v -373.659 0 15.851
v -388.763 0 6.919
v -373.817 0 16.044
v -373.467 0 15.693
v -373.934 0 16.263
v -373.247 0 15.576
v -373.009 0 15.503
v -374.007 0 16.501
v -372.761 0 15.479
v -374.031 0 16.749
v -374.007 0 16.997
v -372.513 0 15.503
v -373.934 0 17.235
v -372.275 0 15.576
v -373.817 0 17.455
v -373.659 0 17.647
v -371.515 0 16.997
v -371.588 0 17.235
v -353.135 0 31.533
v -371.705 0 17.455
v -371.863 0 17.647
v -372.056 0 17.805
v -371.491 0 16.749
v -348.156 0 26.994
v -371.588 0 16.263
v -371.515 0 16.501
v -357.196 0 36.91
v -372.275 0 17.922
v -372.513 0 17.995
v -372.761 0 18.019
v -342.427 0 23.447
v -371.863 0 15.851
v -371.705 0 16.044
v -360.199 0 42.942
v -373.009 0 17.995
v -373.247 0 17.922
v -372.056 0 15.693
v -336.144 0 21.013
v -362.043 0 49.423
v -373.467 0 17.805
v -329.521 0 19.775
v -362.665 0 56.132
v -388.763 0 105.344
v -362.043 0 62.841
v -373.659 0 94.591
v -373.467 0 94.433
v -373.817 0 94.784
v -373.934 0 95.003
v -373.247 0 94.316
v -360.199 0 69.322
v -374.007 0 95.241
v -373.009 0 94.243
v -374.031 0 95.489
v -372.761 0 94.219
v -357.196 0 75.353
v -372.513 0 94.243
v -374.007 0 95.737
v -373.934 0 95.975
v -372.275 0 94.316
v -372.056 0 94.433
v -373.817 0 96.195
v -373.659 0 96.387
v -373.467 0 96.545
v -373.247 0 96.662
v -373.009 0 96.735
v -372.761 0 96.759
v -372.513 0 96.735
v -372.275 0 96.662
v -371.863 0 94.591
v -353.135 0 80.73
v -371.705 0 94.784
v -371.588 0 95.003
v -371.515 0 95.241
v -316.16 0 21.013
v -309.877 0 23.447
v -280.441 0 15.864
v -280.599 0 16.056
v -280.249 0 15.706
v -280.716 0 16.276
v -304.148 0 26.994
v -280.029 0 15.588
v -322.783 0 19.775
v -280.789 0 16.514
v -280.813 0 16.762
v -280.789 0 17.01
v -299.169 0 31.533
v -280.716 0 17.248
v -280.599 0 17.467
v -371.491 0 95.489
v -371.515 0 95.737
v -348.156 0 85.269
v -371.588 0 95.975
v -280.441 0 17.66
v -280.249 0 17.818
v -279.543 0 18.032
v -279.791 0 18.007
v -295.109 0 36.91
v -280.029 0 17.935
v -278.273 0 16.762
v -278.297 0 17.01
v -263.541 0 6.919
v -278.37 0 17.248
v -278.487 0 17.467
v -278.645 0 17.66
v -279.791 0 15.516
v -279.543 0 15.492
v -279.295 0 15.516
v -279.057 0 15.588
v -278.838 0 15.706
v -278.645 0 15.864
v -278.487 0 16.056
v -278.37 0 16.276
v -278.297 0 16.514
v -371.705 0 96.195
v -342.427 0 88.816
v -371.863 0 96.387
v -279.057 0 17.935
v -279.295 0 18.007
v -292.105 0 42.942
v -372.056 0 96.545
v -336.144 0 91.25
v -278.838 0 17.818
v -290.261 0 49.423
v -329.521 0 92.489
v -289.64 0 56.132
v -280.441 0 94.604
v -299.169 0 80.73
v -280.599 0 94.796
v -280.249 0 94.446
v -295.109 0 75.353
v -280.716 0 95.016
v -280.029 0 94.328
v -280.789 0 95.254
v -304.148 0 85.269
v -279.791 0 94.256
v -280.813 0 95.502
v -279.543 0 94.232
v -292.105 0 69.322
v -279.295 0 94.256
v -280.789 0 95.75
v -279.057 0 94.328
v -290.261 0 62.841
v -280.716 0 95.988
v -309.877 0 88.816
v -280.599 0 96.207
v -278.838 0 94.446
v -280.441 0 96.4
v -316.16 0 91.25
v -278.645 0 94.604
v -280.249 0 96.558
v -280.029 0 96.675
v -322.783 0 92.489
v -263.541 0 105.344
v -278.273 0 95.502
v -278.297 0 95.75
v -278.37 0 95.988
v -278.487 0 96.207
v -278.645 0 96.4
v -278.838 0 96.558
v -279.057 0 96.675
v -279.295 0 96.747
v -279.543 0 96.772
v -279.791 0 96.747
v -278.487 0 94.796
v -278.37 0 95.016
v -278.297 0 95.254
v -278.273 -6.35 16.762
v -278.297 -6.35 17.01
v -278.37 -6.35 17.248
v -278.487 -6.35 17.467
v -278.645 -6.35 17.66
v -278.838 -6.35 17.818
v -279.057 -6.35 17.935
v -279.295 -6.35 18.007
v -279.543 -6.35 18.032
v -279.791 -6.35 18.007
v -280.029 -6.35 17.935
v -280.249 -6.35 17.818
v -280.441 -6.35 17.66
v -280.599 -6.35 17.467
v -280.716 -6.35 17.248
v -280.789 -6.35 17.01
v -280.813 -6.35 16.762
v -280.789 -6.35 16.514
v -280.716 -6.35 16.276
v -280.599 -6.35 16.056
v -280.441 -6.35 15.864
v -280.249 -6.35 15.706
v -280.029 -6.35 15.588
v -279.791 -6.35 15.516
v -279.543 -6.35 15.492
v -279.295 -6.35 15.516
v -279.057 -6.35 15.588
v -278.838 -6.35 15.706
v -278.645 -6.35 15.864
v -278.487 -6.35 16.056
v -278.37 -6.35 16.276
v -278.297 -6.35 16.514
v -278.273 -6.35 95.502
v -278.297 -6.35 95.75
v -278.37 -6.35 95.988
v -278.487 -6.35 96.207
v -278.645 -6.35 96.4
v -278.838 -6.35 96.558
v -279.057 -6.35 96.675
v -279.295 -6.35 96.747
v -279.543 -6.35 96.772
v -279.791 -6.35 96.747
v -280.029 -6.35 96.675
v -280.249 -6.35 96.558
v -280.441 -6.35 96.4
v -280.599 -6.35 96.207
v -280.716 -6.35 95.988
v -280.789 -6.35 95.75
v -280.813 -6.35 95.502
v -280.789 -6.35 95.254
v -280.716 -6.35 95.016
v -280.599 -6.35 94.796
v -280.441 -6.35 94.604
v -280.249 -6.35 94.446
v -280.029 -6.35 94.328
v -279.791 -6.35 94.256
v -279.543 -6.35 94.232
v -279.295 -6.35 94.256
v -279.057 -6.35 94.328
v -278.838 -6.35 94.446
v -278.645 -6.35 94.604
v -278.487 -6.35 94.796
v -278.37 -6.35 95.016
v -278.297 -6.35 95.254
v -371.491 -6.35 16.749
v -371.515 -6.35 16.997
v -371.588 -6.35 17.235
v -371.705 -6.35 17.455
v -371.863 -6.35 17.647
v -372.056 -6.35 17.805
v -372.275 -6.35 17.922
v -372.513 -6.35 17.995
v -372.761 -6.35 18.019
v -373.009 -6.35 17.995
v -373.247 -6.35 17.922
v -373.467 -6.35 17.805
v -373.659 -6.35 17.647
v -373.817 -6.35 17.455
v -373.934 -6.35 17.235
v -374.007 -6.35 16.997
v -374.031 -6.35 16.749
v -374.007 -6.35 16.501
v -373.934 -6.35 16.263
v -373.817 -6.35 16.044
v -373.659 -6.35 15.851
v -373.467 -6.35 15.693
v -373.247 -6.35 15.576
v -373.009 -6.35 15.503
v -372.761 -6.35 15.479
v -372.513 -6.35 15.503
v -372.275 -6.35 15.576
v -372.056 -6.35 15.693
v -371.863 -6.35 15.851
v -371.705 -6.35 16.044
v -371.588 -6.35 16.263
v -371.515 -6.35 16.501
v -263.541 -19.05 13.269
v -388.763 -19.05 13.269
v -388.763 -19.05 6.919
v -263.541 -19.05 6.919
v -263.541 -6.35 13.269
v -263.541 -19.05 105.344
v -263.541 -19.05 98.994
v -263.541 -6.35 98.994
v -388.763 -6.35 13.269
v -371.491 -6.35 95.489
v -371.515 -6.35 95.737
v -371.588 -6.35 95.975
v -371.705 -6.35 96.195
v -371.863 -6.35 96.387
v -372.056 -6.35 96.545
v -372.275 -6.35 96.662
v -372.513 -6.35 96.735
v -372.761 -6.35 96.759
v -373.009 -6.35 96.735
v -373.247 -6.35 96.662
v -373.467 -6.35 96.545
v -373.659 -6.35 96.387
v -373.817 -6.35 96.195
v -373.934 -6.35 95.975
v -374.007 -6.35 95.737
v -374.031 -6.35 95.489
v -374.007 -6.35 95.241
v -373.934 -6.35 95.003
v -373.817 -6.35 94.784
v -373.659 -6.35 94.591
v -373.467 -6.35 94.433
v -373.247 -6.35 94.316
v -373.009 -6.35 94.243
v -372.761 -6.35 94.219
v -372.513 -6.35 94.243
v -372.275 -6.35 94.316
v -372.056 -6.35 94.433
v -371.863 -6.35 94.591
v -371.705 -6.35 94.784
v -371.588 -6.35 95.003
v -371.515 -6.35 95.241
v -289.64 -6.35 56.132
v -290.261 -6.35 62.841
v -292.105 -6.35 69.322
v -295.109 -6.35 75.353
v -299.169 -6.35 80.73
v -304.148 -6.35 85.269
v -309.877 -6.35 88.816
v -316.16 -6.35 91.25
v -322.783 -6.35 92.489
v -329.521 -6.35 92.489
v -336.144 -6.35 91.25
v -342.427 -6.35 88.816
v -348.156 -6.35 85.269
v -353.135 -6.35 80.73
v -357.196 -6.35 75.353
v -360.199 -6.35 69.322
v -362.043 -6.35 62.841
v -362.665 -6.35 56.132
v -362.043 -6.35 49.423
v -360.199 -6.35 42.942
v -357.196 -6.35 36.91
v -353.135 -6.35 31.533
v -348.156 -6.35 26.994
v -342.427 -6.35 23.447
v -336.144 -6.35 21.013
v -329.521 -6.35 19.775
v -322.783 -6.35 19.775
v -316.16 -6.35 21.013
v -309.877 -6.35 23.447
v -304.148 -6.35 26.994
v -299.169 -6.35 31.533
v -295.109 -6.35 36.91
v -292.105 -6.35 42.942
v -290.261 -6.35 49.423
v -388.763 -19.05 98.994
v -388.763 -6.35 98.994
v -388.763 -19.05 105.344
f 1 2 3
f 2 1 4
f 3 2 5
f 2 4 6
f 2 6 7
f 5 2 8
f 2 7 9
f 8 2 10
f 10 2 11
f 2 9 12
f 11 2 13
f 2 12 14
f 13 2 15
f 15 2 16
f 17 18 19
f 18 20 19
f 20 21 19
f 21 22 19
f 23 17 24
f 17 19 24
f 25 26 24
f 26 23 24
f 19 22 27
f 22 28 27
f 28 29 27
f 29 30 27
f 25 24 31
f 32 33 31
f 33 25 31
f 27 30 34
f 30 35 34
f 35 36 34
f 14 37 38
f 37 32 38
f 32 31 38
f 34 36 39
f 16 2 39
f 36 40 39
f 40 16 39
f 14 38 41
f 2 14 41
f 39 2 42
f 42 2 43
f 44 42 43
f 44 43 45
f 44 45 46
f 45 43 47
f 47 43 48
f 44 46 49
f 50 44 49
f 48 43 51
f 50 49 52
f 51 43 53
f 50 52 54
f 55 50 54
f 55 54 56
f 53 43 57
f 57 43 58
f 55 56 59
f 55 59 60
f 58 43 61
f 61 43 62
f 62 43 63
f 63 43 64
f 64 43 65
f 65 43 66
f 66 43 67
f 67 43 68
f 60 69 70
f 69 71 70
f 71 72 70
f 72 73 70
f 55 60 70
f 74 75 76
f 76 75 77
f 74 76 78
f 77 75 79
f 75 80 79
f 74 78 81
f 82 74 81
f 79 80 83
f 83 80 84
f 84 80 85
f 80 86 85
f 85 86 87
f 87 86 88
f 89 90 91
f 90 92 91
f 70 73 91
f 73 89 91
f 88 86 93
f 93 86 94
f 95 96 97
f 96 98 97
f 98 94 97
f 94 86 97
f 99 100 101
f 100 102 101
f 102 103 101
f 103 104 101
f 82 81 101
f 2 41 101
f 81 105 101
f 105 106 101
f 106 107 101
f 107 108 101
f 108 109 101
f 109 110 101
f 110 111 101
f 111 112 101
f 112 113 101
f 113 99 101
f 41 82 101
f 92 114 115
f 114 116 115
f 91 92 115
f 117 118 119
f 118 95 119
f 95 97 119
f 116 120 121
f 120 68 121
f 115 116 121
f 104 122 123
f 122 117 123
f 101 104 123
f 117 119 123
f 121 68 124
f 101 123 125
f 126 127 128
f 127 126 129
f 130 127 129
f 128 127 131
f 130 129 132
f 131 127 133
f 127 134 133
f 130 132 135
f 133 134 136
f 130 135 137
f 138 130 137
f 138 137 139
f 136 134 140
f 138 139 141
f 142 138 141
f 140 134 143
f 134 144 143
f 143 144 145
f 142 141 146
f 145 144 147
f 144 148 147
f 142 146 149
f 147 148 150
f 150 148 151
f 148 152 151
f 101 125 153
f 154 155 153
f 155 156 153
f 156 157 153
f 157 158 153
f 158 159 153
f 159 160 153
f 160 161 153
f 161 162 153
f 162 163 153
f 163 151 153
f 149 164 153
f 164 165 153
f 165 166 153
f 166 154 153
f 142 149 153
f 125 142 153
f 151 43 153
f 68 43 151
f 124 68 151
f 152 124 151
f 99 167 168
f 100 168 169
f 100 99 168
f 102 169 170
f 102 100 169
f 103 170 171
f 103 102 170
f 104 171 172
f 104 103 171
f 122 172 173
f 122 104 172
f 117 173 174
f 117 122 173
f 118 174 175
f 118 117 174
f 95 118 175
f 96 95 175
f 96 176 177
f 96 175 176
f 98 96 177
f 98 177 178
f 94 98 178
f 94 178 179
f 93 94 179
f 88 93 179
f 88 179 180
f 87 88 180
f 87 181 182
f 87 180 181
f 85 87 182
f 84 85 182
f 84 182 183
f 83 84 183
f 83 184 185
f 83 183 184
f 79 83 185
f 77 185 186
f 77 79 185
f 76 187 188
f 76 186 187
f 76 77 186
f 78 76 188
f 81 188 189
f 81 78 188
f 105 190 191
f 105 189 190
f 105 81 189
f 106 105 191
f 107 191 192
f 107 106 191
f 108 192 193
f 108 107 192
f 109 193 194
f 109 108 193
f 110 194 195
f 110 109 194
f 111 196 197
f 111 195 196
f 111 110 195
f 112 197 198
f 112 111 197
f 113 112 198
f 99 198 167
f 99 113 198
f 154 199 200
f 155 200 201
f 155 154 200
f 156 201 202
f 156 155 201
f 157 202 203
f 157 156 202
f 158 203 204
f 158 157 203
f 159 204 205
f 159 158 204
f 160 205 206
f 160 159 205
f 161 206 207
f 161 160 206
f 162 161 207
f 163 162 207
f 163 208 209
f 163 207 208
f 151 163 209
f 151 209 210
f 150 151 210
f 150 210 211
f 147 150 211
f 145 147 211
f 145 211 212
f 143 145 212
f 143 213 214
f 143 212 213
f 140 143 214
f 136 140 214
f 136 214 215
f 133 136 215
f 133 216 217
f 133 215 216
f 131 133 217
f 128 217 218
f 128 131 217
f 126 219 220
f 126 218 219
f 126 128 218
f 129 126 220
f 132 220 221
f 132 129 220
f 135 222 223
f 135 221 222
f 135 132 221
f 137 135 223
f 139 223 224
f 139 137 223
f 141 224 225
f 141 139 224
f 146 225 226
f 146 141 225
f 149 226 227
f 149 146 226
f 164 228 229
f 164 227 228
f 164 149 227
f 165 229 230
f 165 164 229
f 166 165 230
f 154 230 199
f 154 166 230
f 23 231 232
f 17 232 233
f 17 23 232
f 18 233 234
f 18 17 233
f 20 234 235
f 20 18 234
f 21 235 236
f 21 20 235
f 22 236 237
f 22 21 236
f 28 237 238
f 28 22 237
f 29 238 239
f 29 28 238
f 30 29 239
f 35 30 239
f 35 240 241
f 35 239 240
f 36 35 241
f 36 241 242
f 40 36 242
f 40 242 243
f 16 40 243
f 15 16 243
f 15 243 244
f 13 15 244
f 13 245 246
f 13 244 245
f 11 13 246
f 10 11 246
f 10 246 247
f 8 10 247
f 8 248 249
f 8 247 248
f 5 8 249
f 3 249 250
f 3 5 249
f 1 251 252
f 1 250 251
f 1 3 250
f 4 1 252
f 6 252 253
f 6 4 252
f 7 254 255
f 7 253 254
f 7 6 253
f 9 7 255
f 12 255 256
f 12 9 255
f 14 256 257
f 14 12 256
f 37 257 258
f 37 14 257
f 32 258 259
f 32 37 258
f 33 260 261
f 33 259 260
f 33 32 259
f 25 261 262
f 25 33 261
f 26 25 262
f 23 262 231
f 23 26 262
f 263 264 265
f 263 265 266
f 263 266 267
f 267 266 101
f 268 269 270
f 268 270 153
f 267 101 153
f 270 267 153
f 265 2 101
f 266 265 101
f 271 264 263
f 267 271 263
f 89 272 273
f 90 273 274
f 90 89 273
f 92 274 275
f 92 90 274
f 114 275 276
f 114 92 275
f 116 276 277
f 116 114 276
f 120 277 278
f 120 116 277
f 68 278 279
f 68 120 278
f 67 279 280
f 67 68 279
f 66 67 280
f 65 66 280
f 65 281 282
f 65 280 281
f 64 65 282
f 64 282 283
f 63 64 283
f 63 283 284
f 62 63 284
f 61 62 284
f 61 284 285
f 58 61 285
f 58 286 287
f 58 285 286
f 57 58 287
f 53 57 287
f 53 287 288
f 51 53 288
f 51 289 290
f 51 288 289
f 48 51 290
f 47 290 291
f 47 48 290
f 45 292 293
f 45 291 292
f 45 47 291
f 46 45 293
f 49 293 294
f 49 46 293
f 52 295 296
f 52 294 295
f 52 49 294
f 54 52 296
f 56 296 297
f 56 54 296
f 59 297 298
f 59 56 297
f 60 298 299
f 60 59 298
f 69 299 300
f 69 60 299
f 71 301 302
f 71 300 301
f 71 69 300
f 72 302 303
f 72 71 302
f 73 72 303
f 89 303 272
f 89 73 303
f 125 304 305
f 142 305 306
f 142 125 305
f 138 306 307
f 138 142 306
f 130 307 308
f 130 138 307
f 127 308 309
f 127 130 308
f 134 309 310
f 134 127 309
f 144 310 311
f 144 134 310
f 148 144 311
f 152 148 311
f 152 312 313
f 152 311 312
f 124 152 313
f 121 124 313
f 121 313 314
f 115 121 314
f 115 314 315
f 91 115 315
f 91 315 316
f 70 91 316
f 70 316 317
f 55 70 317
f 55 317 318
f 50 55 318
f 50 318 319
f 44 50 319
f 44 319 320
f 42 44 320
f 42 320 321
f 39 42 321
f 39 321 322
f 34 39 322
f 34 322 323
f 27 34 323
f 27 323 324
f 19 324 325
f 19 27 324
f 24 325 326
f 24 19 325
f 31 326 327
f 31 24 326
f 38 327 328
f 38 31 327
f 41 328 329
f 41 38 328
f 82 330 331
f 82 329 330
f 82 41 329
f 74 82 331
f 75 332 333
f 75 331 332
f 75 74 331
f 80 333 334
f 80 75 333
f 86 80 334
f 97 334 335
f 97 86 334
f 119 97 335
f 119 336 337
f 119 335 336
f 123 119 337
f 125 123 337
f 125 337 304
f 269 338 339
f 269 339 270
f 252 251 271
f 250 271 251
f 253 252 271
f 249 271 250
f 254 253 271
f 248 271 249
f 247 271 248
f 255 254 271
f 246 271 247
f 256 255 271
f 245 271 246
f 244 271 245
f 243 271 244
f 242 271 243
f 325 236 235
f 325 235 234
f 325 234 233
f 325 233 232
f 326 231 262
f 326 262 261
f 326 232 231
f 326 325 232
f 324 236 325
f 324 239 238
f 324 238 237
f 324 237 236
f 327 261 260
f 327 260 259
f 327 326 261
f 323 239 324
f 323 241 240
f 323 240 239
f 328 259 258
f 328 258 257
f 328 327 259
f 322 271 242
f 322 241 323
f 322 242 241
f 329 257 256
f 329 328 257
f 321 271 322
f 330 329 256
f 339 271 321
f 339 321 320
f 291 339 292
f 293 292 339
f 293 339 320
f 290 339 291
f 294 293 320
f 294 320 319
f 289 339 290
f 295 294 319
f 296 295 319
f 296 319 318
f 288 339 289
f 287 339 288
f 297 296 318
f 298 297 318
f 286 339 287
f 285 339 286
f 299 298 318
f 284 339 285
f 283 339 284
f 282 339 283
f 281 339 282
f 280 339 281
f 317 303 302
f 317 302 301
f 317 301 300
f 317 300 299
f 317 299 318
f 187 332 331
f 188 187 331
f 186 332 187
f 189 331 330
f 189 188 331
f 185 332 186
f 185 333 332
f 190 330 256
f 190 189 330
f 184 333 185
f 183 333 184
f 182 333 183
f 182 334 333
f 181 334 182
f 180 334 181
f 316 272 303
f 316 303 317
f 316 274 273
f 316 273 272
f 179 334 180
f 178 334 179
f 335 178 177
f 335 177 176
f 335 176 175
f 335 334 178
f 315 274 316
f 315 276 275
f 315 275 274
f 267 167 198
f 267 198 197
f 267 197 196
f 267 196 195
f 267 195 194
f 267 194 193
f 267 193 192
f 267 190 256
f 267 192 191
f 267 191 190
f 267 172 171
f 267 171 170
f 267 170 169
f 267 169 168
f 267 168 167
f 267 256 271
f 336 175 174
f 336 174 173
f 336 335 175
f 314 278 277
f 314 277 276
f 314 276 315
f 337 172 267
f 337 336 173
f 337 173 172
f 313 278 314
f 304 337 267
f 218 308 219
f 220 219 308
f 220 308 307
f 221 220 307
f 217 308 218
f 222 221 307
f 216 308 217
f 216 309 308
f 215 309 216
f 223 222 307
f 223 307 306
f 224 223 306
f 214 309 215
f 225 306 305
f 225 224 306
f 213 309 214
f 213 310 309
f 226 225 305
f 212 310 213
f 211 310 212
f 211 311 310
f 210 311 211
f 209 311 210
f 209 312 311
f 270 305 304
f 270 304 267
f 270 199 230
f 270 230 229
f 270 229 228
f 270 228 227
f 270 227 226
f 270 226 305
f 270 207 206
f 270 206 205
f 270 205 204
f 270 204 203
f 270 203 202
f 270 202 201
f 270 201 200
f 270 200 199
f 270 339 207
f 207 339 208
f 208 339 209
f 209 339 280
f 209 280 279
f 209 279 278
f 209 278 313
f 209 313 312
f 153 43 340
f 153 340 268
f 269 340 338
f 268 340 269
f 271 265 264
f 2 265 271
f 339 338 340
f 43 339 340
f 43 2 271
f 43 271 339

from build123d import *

# Parameters (mm, degrees)
F0_W     = 125.222
F0_H     = 98.425
F0_W_2   = 99.822
F0_H_2   = 85.979
F0_R     = 1.27
F0_R_2   = 36.5125
F1_DEPTH = 19.05
F2_W     = 559.8626548463
F2_H     = 85.725
F3_DEPTH = 12.7
F2_W_2   = 125.222
F2_R     = 1.27
F2_R_2   = 36.5125
F4_DEPTH = 12.7


with BuildPart() as f1:
    # F0 (on Front) → F1 (new body)
    with BuildSketch(Plane.XZ):
        with Locations((-326.1520862579, 56.1317810915)):
            Rectangle(F0_W, F0_H)
        with Locations((-326.1520862579, 56.1317810915)):
            Rectangle(F0_W_2, F0_H_2, mode=Mode.SUBTRACT)
        with Locations((-326.1520862579, 56.1317810915)):
            Rectangle(F0_W_2, F0_H_2)
        with Locations((-372.7610862579, 16.7490810915)):
            Circle(F0_R, mode=Mode.SUBTRACT)
        with Locations((-279.5430862579, 16.7617810915)):
            Circle(F0_R, mode=Mode.SUBTRACT)
        with Locations((-326.1520862579, 56.1317810915)):
            Circle(F0_R_2, mode=Mode.SUBTRACT)
        with Locations((-372.7610862579, 95.4890810915)):
            Circle(F0_R, mode=Mode.SUBTRACT)
        with Locations((-279.5430871231, 95.5017810915)):
            Circle(F0_R, mode=Mode.SUBTRACT)
    extrude(amount=F1_DEPTH)

    # F2 (on face) → F3 (cut)
    with BuildSketch(Plane.XZ.offset(19.05)):
        with Locations((-149.6497262269, 56.1317810915)):
            Rectangle(F2_W, F2_H)
    extrude(amount=-F3_DEPTH, mode=Mode.SUBTRACT)

    # F2 (on face) → F4 (cut)
    with BuildSketch(Plane.XZ.offset(19.05)):
        with Locations((-326.1520862579, 56.1317810915)):
            Rectangle(F2_W_2, F2_H)
        with Locations((-372.7610862579, 16.7490810915)):
            Circle(F2_R, mode=Mode.SUBTRACT)
        with Locations((-279.5430862579, 16.7617810915)):
            Circle(F2_R, mode=Mode.SUBTRACT)
        with Locations((-326.1520862579, 56.1317810915)):
            Circle(F2_R_2, mode=Mode.SUBTRACT)
        with Locations((-372.7610862579, 95.4890810915)):
            Circle(F2_R, mode=Mode.SUBTRACT)
        with Locations((-279.5430871231, 95.5017810915)):
            Circle(F2_R, mode=Mode.SUBTRACT)
    extrude(amount=-F4_DEPTH, mode=Mode.SUBTRACT)


solid = f1.part
